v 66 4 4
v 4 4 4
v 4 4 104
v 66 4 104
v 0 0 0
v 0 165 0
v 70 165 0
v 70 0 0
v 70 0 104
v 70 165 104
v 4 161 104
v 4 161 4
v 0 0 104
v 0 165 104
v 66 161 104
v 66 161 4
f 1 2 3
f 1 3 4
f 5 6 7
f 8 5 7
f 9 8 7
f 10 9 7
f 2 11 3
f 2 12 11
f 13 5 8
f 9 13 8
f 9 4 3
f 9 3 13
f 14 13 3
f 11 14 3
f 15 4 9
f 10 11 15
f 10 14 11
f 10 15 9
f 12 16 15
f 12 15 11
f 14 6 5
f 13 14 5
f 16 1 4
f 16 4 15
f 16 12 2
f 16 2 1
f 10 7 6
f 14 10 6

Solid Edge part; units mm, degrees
sketch "Sketch1" plane through (0, 0, 0) normal (0, 0, 1) x (1, 0, 0)
  line L0 (70, 0) -> (70, 165)
  line L1 (70, 165) -> (0, 165)
  line L2 (0, 165) -> (0, 0)
  line L3 (0, 0) -> (70, 0)
extrude "Protrusion1" add sketch "Sketch1" along normal blind 4
sketch "Sketch2" plane through (35, 82.5, 4) normal (0, 0, 1) x (0, 1, 0)
  line L0 (78.5, 31) -> (-78.5, 31)
  line L1 (-78.5, 31) -> (-78.5, -31)
  line L2 (-78.5, -31) -> (78.5, -31)
  line L3 (78.5, -31) -> (78.5, 31)
  line L4 (-82.5, -35) -> (82.5, -35)
  line L5 (82.5, -35) -> (82.5, 35)
  line L6 (82.5, 35) -> (-82.5, 35)
  line L7 (-82.5, 35) -> (-82.5, -35)
extrude "ProtrusiónExtruida_2" add sketch "Sketch2" along normal blind 100
